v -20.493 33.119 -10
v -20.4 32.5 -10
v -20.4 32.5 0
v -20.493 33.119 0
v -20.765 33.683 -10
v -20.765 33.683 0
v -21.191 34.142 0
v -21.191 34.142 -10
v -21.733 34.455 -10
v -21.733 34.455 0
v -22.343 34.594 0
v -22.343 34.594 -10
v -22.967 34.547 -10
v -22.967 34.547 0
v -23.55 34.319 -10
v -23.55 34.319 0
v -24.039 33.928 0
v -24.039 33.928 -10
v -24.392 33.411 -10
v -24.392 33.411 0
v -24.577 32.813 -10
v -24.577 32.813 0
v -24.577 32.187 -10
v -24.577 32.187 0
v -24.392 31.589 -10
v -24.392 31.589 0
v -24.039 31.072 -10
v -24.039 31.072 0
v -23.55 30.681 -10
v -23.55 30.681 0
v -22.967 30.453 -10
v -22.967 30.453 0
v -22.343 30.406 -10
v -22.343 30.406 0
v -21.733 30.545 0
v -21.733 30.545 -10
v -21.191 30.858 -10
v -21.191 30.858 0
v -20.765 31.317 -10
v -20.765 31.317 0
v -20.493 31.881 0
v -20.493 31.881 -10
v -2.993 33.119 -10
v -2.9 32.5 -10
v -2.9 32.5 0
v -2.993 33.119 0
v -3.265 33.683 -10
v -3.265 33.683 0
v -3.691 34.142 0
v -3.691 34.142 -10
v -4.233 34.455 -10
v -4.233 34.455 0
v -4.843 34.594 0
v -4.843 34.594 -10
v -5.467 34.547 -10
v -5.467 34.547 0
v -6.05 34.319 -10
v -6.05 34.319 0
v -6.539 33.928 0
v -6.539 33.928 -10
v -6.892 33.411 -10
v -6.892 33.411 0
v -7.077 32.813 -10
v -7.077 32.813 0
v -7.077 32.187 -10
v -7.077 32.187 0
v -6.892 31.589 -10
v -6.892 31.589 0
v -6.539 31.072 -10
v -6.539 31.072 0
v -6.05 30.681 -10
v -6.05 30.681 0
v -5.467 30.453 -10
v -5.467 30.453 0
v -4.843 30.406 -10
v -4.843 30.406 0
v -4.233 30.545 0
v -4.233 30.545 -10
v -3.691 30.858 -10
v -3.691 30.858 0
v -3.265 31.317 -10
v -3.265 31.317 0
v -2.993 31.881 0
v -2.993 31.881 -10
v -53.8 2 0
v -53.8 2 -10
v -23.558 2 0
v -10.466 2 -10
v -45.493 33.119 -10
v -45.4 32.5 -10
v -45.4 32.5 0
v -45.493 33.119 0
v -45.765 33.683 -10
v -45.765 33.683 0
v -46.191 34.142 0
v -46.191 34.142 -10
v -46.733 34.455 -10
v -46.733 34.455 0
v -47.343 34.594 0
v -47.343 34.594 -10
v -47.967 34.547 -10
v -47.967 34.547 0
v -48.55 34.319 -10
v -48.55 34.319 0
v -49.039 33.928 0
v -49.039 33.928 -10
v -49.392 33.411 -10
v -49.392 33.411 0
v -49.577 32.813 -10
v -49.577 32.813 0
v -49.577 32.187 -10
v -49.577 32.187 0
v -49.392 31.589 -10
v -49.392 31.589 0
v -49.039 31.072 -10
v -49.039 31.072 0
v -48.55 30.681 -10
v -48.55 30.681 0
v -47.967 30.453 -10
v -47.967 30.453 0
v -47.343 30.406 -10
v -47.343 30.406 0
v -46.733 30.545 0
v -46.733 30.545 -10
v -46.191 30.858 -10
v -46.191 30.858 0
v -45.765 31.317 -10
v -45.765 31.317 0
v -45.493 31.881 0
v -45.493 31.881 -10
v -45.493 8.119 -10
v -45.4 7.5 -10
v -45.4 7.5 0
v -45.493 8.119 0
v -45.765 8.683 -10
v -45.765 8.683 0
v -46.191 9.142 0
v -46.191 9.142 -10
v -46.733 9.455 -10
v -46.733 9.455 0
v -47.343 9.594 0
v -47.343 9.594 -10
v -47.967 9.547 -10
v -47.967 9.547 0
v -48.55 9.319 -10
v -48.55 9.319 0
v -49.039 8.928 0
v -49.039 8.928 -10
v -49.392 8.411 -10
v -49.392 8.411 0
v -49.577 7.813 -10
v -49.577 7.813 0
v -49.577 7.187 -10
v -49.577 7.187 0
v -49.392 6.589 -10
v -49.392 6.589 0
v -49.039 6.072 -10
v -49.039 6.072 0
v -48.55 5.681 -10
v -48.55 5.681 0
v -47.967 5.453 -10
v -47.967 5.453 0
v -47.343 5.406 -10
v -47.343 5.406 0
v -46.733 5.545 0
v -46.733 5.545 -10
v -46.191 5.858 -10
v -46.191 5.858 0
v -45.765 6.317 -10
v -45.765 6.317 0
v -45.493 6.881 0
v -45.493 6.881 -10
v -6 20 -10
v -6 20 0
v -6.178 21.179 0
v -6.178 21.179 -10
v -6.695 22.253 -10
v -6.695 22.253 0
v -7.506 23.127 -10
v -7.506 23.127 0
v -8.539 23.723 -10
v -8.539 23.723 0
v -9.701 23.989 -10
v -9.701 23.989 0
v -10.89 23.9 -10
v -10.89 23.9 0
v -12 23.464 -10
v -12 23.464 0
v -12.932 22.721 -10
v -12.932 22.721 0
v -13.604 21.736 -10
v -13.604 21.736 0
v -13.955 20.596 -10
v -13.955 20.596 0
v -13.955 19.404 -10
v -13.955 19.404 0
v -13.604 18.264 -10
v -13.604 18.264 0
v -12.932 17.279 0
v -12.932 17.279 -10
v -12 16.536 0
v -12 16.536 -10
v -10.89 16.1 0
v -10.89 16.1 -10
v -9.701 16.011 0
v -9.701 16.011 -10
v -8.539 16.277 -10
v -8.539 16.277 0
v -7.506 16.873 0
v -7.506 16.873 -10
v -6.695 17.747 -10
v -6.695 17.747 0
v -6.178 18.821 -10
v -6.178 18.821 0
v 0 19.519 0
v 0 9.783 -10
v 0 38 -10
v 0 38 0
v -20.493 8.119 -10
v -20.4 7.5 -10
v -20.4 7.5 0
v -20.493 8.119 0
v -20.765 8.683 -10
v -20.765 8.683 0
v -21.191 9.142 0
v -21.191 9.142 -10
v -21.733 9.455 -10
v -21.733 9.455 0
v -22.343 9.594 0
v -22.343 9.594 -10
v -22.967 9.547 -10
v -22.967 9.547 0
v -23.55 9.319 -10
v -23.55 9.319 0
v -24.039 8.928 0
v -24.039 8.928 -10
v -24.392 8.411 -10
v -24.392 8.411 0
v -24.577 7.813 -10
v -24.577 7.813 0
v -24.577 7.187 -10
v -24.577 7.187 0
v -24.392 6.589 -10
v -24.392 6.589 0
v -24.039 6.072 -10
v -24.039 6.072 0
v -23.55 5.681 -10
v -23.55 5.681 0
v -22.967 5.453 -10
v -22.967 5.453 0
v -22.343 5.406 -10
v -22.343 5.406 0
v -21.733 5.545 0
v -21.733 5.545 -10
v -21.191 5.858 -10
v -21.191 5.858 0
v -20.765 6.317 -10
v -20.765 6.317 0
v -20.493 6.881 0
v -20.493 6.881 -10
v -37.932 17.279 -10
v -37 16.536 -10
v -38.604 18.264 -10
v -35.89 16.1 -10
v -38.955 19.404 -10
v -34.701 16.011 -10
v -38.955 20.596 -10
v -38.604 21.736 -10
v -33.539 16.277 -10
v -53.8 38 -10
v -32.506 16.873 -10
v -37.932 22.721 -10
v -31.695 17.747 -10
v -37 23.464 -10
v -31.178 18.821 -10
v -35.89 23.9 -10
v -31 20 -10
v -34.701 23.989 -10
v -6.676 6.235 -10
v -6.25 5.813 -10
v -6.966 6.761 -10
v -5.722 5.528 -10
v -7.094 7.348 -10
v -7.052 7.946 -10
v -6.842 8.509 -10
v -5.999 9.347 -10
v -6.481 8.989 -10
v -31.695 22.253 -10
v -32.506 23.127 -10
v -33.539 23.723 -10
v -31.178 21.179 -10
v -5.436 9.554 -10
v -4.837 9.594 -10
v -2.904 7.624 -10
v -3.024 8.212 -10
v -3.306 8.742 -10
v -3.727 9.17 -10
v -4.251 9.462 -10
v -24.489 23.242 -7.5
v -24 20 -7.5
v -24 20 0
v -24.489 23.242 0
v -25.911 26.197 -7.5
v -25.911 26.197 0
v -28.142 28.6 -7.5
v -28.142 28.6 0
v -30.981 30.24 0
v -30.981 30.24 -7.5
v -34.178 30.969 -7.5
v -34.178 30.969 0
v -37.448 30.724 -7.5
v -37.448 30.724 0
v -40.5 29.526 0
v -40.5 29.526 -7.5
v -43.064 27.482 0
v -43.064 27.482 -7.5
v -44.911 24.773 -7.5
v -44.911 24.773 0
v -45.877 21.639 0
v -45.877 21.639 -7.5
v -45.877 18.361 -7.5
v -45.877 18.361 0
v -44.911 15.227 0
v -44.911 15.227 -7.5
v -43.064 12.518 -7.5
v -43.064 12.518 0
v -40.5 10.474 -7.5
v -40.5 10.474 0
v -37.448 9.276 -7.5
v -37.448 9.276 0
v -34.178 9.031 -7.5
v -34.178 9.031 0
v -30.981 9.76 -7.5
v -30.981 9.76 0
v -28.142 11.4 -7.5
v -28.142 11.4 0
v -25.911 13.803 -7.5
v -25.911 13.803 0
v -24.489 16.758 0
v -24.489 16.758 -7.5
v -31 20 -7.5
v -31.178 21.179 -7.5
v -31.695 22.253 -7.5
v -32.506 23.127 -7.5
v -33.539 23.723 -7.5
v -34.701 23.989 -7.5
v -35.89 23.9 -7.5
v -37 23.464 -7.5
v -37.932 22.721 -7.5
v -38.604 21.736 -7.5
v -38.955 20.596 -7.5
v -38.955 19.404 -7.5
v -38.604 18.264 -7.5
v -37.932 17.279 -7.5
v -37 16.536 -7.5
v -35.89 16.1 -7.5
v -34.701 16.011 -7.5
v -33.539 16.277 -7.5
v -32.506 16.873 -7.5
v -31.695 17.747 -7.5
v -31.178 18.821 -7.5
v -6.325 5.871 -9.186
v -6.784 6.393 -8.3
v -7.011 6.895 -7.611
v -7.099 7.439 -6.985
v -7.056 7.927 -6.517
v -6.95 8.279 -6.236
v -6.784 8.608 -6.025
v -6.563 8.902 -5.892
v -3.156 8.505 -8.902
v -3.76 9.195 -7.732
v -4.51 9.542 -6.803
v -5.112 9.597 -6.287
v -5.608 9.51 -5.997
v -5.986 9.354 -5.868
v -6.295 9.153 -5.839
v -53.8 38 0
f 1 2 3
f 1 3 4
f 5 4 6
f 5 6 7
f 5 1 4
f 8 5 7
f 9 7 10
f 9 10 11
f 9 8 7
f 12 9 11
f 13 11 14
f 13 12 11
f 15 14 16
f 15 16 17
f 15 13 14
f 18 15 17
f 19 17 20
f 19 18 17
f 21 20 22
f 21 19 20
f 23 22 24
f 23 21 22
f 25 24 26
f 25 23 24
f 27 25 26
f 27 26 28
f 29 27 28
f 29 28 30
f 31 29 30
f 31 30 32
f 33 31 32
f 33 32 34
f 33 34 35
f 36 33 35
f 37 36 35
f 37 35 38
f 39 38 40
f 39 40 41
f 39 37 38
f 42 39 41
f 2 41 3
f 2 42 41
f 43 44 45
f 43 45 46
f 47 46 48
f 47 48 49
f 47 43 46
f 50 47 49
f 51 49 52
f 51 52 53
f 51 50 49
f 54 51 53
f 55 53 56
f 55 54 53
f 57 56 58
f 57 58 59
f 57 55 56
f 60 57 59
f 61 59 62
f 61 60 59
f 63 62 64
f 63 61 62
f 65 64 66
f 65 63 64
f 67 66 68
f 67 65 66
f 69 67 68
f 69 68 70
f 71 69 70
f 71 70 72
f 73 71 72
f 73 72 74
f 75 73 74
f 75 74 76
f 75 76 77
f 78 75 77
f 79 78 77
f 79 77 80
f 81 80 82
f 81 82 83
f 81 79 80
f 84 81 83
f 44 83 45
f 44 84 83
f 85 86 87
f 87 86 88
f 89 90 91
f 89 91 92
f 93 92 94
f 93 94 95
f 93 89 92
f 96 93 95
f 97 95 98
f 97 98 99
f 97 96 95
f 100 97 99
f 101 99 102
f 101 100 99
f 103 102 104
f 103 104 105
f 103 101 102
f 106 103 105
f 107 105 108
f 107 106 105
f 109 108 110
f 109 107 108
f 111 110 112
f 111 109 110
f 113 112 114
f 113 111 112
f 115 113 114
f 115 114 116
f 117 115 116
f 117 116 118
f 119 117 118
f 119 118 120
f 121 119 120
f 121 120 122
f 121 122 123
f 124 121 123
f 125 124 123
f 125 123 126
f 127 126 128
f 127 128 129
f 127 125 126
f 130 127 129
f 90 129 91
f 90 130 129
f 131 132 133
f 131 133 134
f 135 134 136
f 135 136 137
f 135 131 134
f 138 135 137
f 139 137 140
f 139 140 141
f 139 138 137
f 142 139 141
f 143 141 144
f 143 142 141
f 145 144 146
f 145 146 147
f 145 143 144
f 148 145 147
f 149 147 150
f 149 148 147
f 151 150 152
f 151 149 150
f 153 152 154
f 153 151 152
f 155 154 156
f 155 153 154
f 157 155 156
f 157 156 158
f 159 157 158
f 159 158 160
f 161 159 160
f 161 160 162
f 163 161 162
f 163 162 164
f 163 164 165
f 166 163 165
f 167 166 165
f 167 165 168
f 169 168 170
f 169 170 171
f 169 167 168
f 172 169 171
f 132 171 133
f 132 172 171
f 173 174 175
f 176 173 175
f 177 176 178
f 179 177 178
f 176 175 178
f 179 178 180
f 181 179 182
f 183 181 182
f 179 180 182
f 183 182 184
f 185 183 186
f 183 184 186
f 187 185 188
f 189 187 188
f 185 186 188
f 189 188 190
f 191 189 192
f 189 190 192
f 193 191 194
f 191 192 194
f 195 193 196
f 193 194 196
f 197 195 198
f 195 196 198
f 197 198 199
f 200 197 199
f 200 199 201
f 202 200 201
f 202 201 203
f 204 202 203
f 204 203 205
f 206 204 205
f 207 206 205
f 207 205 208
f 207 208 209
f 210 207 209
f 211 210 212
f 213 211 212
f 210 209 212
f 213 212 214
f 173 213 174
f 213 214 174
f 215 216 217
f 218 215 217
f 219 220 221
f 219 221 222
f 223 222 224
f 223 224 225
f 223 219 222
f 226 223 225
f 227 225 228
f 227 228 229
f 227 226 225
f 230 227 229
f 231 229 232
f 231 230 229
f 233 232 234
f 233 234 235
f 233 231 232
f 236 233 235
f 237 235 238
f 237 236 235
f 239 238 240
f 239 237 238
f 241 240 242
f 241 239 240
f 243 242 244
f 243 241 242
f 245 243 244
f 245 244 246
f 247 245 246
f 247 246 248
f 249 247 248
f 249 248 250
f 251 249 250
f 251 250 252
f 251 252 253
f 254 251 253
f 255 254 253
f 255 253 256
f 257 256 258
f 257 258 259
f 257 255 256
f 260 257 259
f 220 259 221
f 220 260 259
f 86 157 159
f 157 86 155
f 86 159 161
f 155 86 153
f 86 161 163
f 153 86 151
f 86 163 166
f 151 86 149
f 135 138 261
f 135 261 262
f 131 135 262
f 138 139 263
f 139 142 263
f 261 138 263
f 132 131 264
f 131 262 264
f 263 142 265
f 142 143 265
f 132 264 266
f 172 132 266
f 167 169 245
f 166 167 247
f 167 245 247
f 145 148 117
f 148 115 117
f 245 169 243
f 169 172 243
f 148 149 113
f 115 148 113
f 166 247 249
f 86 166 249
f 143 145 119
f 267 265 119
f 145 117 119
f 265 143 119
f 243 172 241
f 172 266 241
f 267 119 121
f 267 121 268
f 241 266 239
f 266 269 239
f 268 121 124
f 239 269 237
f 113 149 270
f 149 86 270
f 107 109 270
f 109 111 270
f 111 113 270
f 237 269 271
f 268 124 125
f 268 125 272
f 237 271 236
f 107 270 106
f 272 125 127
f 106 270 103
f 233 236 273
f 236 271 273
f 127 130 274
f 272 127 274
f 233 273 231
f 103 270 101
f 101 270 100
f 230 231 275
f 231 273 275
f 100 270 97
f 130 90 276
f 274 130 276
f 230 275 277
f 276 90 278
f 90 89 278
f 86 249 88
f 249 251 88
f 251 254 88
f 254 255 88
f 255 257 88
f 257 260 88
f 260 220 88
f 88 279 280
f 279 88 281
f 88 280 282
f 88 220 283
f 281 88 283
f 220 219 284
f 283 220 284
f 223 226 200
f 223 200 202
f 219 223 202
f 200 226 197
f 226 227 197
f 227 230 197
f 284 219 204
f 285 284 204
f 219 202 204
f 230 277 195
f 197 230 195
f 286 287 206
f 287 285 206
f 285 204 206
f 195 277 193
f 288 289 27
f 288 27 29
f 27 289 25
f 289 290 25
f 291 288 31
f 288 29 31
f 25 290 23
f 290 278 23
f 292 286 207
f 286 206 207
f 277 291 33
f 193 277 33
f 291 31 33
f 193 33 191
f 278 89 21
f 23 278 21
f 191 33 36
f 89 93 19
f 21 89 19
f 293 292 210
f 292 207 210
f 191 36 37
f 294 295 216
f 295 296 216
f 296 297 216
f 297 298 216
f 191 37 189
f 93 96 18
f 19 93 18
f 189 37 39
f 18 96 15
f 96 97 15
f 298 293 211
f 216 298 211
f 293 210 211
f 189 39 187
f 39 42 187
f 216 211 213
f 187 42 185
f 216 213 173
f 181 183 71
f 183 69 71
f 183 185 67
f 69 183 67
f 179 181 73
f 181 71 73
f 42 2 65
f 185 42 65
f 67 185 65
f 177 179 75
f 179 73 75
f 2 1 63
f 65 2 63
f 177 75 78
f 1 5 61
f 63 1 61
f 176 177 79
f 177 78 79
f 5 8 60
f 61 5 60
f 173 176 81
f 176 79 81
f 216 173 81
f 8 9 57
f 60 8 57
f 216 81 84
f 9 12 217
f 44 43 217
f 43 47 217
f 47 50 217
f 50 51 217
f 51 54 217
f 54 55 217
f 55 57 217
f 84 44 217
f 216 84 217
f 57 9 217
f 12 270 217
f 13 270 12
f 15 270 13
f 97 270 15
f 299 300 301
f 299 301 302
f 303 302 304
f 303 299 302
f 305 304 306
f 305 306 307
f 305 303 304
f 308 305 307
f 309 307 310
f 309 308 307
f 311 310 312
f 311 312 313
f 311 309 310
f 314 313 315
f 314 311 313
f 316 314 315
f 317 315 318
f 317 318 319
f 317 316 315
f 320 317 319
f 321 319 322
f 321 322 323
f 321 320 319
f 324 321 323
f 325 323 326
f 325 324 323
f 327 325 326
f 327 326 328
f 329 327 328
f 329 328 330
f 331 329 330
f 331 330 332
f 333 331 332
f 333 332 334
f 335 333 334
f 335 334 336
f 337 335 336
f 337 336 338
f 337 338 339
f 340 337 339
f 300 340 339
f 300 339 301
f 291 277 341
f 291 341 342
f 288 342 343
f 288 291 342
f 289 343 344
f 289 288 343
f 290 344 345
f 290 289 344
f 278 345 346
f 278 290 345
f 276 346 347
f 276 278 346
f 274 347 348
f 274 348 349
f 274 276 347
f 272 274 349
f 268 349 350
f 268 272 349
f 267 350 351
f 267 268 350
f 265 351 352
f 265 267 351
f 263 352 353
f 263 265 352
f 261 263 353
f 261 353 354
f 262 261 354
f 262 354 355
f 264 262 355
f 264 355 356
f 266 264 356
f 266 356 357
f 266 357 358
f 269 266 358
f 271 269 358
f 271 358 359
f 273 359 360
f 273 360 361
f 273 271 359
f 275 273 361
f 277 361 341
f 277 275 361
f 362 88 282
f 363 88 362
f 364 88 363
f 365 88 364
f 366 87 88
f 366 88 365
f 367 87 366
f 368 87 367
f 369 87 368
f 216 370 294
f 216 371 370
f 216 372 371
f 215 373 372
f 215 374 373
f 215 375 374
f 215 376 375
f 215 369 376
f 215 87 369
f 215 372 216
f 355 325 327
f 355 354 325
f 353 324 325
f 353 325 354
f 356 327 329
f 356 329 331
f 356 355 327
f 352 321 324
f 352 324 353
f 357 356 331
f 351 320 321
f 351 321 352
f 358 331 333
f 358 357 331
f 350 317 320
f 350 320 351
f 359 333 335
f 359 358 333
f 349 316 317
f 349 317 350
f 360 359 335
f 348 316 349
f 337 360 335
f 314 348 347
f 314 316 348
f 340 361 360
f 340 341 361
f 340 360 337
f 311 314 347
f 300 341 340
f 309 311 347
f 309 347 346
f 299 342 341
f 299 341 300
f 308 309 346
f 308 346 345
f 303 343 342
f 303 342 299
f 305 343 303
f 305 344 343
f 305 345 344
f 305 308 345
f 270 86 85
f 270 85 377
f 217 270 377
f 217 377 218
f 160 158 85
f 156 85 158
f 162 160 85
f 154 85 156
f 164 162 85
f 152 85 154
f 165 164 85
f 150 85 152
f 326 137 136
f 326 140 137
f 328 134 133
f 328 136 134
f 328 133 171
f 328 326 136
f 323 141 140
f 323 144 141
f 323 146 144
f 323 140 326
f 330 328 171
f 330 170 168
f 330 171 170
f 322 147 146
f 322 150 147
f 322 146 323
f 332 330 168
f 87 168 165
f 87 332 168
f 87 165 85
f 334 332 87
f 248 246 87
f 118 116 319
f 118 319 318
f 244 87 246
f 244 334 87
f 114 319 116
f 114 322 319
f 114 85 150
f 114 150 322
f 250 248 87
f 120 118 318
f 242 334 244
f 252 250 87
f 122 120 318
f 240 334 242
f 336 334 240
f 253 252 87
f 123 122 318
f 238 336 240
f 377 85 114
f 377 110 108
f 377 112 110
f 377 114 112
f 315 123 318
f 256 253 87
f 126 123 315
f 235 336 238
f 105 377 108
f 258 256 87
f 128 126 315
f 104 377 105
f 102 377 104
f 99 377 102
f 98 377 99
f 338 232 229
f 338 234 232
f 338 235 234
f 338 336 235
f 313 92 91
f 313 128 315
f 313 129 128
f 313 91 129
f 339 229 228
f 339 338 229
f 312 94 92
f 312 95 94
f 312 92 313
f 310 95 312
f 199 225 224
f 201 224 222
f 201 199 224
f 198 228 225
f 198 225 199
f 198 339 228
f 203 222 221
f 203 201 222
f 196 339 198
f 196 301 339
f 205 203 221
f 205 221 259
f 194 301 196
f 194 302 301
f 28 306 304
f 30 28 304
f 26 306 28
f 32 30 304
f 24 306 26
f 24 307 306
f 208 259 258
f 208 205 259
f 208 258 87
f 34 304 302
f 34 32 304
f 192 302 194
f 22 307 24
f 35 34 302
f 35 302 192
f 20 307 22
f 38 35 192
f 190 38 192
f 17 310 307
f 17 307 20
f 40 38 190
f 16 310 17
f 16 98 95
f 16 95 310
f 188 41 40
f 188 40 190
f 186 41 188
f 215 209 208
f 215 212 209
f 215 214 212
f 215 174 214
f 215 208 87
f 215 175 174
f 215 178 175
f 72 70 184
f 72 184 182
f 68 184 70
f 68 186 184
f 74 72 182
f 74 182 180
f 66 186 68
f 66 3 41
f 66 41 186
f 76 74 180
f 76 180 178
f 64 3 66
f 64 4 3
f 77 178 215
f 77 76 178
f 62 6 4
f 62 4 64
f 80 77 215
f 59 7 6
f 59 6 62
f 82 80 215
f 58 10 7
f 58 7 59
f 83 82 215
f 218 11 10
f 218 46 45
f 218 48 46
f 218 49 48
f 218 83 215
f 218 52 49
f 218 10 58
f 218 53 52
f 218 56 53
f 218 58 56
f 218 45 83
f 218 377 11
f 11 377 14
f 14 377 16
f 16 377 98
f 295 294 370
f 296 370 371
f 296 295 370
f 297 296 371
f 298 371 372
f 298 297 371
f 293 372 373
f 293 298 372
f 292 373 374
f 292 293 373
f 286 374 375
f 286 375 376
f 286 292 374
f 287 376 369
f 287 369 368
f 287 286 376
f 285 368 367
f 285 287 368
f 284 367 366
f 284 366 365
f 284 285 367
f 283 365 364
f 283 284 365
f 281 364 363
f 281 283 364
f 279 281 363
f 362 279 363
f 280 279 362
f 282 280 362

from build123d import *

# Parameters (mm, degrees)
JOTYY_MIRRORED_START         = -10
JOTYY_MIRRORED_OUTLINE_W     = 53.8
JOTYY_MIRRORED_OUTLINE_H     = 36
JOTYY_MIRRORED_OUTLINE_R     = 2.1
JOTYY_MIRRORED_OUTLINE_R_2   = 11
JOTYY_MIRRORED_DEPTH         = 10
JOTYY_MIRRORED_2_OUTLINE_R   = 11
JOTYY_MIRRORED_2_OUTLINE_R_2 = 4
JOTYY_MIRRORED_2_DEPTH       = 2.5
SKETCH1_R                    = 4
CUT_EXTRUDE1_DEPTH           = 10
CUT_EXTRUDE2_DEPTH           = 58.211226571


# Read off the part's stored shape, not the designer's step: jotyy_Mirrored
with BuildPart() as part:
    # jotyy_Mirrored outline → jotyy_Mirrored (new body)
    with BuildSketch(Plane.XY.offset(JOTYY_MIRRORED_START)):
        with Locations((-26.9, 20)):
            Rectangle(JOTYY_MIRRORED_OUTLINE_W, JOTYY_MIRRORED_OUTLINE_H)
        with Locations((-47.5, 7.5)):
            Circle(JOTYY_MIRRORED_OUTLINE_R, mode=Mode.SUBTRACT)
        with Locations((-22.5, 7.5)):
            Circle(JOTYY_MIRRORED_OUTLINE_R, mode=Mode.SUBTRACT)
        with Locations((-5, 7.5)):
            Circle(JOTYY_MIRRORED_OUTLINE_R, mode=Mode.SUBTRACT)
        with Locations((-35, 20)):
            Circle(JOTYY_MIRRORED_OUTLINE_R_2, mode=Mode.SUBTRACT)
        with Locations((-47.5, 32.5)):
            Circle(JOTYY_MIRRORED_OUTLINE_R, mode=Mode.SUBTRACT)
        with Locations((-22.5, 32.5)):
            Circle(JOTYY_MIRRORED_OUTLINE_R, mode=Mode.SUBTRACT)
        with Locations((-5, 32.5)):
            Circle(JOTYY_MIRRORED_OUTLINE_R, mode=Mode.SUBTRACT)
    extrude(amount=JOTYY_MIRRORED_DEPTH)

    # jotyy_Mirrored 2 outline → jotyy_Mirrored 2 (add)
    with BuildSketch(Plane.XY.offset(JOTYY_MIRRORED_START)):
        with Locations((-35, 20)):
            Circle(JOTYY_MIRRORED_2_OUTLINE_R)
        with Locations((-35, 20)):
            Circle(JOTYY_MIRRORED_2_OUTLINE_R_2, mode=Mode.SUBTRACT)
    extrude(amount=JOTYY_MIRRORED_2_DEPTH)

    # Sketch1 → Cut-Extrude1 (cut)
    with BuildSketch(Plane.XY):
        with Locations((-10, 20)):
            Circle(SKETCH1_R)
    extrude(amount=-CUT_EXTRUDE1_DEPTH, mode=Mode.SUBTRACT)

    # Sketch4 → Cut-Extrude2 (cut, through all)
    with BuildSketch(Plane(origin=(-5.803979924, 7.804579549, -7.598887182), x_dir=(-0.8814294563143725, -0.3015166465944173, 0.36355168183878195), z_dir=(-0.47023817530075585, 0.6323266610618664, -0.6156614753256593))):
        Polygon((64.66091517, 41.829227813), (-62.885997207, -203.452641014), (-179.111332111, -143.015305479), (-51.564419733, 102.266563348), align=None)
    extrude(amount=-CUT_EXTRUDE2_DEPTH, mode=Mode.SUBTRACT)


solid = part.part
